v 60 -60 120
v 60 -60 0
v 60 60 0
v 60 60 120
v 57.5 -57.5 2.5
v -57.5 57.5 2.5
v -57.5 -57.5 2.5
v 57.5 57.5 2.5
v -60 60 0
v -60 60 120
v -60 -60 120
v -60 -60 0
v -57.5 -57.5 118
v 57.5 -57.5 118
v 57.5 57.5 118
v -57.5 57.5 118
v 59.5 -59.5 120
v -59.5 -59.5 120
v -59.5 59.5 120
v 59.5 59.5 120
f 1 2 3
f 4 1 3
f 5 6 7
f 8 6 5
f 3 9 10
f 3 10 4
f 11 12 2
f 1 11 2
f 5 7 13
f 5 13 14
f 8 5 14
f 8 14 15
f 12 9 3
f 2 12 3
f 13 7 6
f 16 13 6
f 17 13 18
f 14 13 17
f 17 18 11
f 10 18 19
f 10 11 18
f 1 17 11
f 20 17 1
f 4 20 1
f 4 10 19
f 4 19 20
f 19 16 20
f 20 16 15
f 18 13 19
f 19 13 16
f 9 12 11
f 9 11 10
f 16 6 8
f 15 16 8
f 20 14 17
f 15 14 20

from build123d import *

# Parameters (mm, degrees)
F0_W     = 120
F0_H     = 120
F1_DEPTH = 120
F2_T     = -2.5
F3_SIZE  = 2


with BuildPart() as f1:
    # F0 (on Top) → F1 (new body)
    with BuildSketch(Plane.XY):
        Rectangle(F0_W, F0_H)
    extrude(amount=F1_DEPTH)

    # F2
    f2_openings = [f1.faces().sort_by_distance(p)[0] for p in [
        (0, 0, 120),
    ]]
    offset(amount=F2_T, openings=f2_openings)

    # F3
    f3_edges = [f1.edges().sort_by_distance(p)[0] for p in [
        (0, 57.5, 120),
        (-57.5, 0, 120),
        (0, -57.5, 120),
        (57.5, 0, 120),
    ]]
    chamfer(f3_edges, length=F3_SIZE)


solid = f1.part
